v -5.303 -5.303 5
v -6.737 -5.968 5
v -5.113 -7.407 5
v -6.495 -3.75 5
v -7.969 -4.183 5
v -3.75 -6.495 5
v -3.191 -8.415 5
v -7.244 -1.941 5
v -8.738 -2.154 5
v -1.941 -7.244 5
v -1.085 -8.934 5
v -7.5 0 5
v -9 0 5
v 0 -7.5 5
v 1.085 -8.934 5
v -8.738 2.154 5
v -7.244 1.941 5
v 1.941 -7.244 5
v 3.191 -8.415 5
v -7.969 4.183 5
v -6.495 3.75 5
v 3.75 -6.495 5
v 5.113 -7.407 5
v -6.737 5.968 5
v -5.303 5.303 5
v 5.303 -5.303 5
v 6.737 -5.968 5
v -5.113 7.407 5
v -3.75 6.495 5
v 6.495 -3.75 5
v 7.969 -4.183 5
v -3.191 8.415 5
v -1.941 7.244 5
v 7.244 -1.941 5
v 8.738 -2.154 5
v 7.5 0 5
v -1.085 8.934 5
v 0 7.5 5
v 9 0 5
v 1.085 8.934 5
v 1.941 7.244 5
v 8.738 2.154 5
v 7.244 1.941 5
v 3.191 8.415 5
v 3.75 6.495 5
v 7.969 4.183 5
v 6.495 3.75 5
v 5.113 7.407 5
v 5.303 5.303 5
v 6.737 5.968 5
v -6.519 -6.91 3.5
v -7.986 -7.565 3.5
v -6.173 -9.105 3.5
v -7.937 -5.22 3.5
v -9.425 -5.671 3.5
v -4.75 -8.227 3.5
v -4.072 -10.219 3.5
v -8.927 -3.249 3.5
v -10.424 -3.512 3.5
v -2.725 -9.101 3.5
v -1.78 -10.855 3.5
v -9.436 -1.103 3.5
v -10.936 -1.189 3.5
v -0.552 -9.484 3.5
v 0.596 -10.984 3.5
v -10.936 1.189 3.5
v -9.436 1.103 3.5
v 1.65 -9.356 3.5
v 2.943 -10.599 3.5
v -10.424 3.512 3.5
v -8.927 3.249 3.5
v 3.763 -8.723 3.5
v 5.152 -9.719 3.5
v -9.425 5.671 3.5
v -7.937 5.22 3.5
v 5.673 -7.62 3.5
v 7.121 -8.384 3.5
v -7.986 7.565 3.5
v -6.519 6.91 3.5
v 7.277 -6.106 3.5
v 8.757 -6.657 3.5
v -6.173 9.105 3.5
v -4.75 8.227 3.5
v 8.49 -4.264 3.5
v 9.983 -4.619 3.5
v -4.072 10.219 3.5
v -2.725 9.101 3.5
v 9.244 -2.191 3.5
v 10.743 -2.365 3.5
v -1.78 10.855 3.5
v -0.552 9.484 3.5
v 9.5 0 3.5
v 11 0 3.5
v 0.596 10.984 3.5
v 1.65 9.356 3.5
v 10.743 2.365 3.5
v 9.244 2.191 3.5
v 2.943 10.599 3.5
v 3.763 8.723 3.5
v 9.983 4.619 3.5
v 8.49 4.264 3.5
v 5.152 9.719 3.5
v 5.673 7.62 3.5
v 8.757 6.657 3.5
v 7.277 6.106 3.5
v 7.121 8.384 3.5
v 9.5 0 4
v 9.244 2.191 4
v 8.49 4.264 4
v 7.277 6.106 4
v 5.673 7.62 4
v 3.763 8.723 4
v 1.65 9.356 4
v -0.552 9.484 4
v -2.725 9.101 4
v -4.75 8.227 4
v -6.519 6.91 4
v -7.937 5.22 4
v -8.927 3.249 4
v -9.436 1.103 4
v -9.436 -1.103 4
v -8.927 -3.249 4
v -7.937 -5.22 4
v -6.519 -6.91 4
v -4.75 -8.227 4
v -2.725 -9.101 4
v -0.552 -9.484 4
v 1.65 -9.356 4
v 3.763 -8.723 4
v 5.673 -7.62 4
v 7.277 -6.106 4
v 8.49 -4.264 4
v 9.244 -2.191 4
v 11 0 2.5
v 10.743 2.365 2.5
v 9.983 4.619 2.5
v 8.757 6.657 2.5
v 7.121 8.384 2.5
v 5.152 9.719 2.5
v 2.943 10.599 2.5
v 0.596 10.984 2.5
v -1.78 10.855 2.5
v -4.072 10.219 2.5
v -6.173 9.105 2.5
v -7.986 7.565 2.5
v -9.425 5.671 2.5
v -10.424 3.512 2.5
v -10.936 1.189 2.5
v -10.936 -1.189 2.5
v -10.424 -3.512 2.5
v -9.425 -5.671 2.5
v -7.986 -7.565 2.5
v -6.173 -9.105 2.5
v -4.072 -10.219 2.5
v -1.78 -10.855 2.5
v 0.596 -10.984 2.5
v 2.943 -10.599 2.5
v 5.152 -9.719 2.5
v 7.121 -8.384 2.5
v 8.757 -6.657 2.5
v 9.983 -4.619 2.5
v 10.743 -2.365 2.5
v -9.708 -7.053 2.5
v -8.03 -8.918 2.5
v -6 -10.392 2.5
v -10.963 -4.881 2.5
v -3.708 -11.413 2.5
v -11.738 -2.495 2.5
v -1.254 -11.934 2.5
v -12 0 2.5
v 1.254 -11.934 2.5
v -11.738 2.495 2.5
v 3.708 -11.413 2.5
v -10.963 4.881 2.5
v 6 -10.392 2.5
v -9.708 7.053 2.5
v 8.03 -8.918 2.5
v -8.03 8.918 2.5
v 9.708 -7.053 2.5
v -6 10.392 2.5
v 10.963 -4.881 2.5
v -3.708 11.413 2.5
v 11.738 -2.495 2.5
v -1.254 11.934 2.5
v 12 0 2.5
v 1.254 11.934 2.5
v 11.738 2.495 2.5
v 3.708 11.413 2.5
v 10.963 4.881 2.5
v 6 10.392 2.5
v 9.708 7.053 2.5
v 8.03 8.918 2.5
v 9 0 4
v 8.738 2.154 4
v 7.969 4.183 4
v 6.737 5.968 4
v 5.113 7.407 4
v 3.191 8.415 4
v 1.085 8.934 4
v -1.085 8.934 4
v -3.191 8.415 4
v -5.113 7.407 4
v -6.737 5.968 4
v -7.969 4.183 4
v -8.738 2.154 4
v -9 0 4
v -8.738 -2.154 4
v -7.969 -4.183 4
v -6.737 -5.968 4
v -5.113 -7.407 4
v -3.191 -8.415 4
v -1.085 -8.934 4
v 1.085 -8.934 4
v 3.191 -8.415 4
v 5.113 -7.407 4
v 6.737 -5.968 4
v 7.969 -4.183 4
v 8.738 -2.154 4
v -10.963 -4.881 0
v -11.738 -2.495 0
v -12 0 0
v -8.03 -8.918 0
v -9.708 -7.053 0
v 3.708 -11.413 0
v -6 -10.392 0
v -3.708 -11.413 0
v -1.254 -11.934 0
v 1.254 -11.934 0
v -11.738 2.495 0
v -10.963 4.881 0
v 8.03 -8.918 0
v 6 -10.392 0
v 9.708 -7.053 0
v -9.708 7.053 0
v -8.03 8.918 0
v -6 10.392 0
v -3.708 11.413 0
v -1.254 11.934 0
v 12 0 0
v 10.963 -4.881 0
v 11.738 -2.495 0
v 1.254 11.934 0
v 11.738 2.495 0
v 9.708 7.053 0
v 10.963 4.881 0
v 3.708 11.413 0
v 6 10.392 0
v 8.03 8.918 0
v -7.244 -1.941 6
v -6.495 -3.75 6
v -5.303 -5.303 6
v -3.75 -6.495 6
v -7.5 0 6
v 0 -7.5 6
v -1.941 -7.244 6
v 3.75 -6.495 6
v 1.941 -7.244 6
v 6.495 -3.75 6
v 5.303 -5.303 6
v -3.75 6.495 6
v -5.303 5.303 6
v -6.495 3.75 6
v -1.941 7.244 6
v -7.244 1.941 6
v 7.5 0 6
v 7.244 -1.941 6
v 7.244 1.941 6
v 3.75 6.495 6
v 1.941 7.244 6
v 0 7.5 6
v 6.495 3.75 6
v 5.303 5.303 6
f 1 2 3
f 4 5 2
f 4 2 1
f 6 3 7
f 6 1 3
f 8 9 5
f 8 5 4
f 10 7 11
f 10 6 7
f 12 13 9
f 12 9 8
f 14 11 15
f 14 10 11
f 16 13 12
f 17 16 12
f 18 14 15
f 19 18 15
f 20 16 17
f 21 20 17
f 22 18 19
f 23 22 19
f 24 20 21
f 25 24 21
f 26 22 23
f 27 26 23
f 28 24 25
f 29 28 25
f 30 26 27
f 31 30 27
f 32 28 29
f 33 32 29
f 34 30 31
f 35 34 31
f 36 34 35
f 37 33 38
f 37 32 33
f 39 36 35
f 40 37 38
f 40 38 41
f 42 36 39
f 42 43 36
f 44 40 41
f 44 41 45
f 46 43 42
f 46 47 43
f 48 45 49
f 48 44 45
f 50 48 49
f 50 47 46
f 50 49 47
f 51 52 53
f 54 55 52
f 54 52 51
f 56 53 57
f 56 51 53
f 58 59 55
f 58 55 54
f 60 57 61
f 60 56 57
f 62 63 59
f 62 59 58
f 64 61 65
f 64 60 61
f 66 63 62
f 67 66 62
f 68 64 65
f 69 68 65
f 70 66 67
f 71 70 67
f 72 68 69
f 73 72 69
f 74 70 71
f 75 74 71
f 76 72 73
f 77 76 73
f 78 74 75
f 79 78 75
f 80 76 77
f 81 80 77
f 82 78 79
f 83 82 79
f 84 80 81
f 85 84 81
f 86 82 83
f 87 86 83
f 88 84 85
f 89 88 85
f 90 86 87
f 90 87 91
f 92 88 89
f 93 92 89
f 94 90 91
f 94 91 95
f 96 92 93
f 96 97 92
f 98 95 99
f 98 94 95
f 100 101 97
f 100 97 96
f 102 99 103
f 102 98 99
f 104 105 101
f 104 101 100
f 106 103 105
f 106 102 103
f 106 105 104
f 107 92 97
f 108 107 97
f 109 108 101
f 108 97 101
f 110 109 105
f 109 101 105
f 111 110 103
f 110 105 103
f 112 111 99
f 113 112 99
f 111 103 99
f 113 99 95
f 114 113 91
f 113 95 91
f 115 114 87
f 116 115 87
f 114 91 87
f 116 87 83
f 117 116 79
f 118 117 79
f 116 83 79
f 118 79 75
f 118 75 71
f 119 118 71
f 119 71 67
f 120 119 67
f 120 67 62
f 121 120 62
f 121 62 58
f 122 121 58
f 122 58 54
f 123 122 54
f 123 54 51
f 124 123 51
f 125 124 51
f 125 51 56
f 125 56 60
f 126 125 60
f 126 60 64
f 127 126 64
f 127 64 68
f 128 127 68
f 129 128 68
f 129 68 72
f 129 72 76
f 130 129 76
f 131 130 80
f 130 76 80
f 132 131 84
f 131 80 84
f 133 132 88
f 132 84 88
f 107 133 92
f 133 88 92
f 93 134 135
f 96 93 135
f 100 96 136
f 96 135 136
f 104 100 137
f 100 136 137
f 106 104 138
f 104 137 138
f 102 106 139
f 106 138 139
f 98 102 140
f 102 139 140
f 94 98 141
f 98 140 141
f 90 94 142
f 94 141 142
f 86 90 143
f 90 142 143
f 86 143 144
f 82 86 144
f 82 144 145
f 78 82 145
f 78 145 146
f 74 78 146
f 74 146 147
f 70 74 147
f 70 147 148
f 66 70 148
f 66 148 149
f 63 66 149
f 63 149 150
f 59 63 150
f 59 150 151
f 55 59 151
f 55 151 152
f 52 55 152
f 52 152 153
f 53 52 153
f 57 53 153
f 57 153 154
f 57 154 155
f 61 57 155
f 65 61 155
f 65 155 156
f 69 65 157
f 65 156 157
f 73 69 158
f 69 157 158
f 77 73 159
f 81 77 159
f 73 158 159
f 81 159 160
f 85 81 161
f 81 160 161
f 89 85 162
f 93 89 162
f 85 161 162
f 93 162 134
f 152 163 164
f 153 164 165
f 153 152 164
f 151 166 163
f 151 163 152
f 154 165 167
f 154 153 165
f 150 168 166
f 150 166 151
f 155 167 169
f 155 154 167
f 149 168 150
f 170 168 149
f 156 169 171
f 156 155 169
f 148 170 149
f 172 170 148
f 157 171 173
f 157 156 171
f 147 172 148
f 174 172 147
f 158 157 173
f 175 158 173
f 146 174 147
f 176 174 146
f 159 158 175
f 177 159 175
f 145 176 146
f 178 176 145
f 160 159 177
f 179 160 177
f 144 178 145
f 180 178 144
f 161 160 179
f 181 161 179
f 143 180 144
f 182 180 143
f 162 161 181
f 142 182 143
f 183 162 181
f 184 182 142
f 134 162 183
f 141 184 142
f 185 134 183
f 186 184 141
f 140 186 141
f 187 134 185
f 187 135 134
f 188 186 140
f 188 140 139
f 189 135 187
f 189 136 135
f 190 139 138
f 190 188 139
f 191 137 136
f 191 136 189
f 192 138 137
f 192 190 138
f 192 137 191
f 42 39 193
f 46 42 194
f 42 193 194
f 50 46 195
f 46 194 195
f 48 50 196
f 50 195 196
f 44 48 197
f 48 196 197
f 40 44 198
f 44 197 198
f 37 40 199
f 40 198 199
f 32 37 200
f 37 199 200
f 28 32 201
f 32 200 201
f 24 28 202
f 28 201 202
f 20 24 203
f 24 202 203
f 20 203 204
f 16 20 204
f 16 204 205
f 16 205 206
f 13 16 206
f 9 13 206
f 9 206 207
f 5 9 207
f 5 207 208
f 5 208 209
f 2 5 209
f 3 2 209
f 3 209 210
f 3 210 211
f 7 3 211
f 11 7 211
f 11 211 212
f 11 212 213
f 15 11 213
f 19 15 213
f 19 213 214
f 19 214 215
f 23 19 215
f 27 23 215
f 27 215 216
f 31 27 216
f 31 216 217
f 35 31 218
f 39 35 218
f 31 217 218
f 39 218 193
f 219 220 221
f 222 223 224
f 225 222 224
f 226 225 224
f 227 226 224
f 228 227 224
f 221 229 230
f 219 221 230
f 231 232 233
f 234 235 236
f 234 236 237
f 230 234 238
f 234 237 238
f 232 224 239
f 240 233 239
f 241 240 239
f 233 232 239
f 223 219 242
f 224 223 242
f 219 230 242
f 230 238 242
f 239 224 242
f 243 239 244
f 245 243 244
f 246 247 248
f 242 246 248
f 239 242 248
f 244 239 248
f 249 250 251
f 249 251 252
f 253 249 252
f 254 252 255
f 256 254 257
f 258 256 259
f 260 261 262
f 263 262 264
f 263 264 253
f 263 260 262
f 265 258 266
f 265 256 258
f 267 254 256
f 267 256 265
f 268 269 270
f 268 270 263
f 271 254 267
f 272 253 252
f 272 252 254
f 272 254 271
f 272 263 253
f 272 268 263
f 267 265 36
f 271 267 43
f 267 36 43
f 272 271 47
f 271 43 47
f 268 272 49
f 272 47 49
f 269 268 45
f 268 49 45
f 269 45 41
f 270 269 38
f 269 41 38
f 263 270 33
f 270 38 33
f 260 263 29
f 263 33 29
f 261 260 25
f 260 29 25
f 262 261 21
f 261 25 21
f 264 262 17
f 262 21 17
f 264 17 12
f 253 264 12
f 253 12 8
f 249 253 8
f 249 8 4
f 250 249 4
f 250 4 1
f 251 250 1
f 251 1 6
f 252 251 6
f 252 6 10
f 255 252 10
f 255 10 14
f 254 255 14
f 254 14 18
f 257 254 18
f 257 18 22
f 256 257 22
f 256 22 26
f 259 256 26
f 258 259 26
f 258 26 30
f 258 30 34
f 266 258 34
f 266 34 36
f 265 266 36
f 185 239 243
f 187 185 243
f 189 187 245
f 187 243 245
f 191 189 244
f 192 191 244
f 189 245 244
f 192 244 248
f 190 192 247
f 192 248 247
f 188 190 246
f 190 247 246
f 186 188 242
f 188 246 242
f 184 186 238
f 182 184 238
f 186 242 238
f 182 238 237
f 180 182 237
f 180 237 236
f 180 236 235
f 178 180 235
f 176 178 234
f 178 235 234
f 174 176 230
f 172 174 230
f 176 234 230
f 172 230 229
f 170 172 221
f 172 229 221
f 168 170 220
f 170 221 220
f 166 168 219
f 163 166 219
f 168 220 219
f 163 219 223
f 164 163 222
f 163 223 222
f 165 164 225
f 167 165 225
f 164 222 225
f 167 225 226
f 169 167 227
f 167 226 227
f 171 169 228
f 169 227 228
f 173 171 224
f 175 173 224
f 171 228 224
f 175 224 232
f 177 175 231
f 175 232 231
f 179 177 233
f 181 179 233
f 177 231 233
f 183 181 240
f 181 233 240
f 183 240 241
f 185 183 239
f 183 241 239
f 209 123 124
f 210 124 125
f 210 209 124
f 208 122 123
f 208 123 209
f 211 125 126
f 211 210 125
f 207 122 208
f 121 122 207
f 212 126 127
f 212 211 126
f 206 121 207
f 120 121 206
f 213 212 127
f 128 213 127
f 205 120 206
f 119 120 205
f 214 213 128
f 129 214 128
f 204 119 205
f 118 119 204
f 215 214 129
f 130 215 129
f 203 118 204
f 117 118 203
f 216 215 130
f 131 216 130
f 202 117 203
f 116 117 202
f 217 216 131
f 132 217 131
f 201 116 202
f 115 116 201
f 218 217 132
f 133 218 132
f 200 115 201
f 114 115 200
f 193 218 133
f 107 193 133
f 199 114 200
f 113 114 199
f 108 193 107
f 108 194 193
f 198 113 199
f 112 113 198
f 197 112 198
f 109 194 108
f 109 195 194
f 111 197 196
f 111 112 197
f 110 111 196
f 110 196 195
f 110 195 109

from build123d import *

# Parameters (mm, degrees)
SKETCH001_R      = 9
EXTRUDE001_DEPTH = 5
SKETCH002_R      = 9.5
EXTRUDE002_DEPTH = 4
SKETCH003_R      = 11
EXTRUDE003_DEPTH = 3.5
SKETCH004_R      = 12
EXTRUDE004_DEPTH = 2.5
SKETCH_R         = 7.5
EXTRUDE_DEPTH    = 6


with BuildPart() as extrude001:
    # Sketch001 → Extrude001 (new body)
    with BuildSketch(Plane.XY):
        Circle(SKETCH001_R)
    extrude(amount=EXTRUDE001_DEPTH)


with BuildPart() as extrude002:
    # Sketch002 → Extrude002 (new body)
    with BuildSketch(Plane.XY):
        Circle(SKETCH002_R)
    extrude(amount=EXTRUDE002_DEPTH)


with BuildPart() as extrude003:
    # Sketch003 → Extrude003 (new body)
    with BuildSketch(Plane.XY):
        Circle(SKETCH003_R)
    extrude(amount=EXTRUDE003_DEPTH)


with BuildPart() as extrude004:
    # Sketch004 → Extrude004 (new body)
    with BuildSketch(Plane.XY):
        Circle(SKETCH004_R)
    extrude(amount=EXTRUDE004_DEPTH)


with BuildPart() as fusion:
    # Sketch → Extrude (new body)
    with BuildSketch(Plane.XY):
        Circle(SKETCH_R)
    extrude(amount=EXTRUDE_DEPTH)

    # Fusion: union Extrude001, Extrude002, Extrude003, Extrude004
    add(extrude001.part)
    add(extrude002.part)
    add(extrude003.part)
    add(extrude004.part)


solid = fusion.part
